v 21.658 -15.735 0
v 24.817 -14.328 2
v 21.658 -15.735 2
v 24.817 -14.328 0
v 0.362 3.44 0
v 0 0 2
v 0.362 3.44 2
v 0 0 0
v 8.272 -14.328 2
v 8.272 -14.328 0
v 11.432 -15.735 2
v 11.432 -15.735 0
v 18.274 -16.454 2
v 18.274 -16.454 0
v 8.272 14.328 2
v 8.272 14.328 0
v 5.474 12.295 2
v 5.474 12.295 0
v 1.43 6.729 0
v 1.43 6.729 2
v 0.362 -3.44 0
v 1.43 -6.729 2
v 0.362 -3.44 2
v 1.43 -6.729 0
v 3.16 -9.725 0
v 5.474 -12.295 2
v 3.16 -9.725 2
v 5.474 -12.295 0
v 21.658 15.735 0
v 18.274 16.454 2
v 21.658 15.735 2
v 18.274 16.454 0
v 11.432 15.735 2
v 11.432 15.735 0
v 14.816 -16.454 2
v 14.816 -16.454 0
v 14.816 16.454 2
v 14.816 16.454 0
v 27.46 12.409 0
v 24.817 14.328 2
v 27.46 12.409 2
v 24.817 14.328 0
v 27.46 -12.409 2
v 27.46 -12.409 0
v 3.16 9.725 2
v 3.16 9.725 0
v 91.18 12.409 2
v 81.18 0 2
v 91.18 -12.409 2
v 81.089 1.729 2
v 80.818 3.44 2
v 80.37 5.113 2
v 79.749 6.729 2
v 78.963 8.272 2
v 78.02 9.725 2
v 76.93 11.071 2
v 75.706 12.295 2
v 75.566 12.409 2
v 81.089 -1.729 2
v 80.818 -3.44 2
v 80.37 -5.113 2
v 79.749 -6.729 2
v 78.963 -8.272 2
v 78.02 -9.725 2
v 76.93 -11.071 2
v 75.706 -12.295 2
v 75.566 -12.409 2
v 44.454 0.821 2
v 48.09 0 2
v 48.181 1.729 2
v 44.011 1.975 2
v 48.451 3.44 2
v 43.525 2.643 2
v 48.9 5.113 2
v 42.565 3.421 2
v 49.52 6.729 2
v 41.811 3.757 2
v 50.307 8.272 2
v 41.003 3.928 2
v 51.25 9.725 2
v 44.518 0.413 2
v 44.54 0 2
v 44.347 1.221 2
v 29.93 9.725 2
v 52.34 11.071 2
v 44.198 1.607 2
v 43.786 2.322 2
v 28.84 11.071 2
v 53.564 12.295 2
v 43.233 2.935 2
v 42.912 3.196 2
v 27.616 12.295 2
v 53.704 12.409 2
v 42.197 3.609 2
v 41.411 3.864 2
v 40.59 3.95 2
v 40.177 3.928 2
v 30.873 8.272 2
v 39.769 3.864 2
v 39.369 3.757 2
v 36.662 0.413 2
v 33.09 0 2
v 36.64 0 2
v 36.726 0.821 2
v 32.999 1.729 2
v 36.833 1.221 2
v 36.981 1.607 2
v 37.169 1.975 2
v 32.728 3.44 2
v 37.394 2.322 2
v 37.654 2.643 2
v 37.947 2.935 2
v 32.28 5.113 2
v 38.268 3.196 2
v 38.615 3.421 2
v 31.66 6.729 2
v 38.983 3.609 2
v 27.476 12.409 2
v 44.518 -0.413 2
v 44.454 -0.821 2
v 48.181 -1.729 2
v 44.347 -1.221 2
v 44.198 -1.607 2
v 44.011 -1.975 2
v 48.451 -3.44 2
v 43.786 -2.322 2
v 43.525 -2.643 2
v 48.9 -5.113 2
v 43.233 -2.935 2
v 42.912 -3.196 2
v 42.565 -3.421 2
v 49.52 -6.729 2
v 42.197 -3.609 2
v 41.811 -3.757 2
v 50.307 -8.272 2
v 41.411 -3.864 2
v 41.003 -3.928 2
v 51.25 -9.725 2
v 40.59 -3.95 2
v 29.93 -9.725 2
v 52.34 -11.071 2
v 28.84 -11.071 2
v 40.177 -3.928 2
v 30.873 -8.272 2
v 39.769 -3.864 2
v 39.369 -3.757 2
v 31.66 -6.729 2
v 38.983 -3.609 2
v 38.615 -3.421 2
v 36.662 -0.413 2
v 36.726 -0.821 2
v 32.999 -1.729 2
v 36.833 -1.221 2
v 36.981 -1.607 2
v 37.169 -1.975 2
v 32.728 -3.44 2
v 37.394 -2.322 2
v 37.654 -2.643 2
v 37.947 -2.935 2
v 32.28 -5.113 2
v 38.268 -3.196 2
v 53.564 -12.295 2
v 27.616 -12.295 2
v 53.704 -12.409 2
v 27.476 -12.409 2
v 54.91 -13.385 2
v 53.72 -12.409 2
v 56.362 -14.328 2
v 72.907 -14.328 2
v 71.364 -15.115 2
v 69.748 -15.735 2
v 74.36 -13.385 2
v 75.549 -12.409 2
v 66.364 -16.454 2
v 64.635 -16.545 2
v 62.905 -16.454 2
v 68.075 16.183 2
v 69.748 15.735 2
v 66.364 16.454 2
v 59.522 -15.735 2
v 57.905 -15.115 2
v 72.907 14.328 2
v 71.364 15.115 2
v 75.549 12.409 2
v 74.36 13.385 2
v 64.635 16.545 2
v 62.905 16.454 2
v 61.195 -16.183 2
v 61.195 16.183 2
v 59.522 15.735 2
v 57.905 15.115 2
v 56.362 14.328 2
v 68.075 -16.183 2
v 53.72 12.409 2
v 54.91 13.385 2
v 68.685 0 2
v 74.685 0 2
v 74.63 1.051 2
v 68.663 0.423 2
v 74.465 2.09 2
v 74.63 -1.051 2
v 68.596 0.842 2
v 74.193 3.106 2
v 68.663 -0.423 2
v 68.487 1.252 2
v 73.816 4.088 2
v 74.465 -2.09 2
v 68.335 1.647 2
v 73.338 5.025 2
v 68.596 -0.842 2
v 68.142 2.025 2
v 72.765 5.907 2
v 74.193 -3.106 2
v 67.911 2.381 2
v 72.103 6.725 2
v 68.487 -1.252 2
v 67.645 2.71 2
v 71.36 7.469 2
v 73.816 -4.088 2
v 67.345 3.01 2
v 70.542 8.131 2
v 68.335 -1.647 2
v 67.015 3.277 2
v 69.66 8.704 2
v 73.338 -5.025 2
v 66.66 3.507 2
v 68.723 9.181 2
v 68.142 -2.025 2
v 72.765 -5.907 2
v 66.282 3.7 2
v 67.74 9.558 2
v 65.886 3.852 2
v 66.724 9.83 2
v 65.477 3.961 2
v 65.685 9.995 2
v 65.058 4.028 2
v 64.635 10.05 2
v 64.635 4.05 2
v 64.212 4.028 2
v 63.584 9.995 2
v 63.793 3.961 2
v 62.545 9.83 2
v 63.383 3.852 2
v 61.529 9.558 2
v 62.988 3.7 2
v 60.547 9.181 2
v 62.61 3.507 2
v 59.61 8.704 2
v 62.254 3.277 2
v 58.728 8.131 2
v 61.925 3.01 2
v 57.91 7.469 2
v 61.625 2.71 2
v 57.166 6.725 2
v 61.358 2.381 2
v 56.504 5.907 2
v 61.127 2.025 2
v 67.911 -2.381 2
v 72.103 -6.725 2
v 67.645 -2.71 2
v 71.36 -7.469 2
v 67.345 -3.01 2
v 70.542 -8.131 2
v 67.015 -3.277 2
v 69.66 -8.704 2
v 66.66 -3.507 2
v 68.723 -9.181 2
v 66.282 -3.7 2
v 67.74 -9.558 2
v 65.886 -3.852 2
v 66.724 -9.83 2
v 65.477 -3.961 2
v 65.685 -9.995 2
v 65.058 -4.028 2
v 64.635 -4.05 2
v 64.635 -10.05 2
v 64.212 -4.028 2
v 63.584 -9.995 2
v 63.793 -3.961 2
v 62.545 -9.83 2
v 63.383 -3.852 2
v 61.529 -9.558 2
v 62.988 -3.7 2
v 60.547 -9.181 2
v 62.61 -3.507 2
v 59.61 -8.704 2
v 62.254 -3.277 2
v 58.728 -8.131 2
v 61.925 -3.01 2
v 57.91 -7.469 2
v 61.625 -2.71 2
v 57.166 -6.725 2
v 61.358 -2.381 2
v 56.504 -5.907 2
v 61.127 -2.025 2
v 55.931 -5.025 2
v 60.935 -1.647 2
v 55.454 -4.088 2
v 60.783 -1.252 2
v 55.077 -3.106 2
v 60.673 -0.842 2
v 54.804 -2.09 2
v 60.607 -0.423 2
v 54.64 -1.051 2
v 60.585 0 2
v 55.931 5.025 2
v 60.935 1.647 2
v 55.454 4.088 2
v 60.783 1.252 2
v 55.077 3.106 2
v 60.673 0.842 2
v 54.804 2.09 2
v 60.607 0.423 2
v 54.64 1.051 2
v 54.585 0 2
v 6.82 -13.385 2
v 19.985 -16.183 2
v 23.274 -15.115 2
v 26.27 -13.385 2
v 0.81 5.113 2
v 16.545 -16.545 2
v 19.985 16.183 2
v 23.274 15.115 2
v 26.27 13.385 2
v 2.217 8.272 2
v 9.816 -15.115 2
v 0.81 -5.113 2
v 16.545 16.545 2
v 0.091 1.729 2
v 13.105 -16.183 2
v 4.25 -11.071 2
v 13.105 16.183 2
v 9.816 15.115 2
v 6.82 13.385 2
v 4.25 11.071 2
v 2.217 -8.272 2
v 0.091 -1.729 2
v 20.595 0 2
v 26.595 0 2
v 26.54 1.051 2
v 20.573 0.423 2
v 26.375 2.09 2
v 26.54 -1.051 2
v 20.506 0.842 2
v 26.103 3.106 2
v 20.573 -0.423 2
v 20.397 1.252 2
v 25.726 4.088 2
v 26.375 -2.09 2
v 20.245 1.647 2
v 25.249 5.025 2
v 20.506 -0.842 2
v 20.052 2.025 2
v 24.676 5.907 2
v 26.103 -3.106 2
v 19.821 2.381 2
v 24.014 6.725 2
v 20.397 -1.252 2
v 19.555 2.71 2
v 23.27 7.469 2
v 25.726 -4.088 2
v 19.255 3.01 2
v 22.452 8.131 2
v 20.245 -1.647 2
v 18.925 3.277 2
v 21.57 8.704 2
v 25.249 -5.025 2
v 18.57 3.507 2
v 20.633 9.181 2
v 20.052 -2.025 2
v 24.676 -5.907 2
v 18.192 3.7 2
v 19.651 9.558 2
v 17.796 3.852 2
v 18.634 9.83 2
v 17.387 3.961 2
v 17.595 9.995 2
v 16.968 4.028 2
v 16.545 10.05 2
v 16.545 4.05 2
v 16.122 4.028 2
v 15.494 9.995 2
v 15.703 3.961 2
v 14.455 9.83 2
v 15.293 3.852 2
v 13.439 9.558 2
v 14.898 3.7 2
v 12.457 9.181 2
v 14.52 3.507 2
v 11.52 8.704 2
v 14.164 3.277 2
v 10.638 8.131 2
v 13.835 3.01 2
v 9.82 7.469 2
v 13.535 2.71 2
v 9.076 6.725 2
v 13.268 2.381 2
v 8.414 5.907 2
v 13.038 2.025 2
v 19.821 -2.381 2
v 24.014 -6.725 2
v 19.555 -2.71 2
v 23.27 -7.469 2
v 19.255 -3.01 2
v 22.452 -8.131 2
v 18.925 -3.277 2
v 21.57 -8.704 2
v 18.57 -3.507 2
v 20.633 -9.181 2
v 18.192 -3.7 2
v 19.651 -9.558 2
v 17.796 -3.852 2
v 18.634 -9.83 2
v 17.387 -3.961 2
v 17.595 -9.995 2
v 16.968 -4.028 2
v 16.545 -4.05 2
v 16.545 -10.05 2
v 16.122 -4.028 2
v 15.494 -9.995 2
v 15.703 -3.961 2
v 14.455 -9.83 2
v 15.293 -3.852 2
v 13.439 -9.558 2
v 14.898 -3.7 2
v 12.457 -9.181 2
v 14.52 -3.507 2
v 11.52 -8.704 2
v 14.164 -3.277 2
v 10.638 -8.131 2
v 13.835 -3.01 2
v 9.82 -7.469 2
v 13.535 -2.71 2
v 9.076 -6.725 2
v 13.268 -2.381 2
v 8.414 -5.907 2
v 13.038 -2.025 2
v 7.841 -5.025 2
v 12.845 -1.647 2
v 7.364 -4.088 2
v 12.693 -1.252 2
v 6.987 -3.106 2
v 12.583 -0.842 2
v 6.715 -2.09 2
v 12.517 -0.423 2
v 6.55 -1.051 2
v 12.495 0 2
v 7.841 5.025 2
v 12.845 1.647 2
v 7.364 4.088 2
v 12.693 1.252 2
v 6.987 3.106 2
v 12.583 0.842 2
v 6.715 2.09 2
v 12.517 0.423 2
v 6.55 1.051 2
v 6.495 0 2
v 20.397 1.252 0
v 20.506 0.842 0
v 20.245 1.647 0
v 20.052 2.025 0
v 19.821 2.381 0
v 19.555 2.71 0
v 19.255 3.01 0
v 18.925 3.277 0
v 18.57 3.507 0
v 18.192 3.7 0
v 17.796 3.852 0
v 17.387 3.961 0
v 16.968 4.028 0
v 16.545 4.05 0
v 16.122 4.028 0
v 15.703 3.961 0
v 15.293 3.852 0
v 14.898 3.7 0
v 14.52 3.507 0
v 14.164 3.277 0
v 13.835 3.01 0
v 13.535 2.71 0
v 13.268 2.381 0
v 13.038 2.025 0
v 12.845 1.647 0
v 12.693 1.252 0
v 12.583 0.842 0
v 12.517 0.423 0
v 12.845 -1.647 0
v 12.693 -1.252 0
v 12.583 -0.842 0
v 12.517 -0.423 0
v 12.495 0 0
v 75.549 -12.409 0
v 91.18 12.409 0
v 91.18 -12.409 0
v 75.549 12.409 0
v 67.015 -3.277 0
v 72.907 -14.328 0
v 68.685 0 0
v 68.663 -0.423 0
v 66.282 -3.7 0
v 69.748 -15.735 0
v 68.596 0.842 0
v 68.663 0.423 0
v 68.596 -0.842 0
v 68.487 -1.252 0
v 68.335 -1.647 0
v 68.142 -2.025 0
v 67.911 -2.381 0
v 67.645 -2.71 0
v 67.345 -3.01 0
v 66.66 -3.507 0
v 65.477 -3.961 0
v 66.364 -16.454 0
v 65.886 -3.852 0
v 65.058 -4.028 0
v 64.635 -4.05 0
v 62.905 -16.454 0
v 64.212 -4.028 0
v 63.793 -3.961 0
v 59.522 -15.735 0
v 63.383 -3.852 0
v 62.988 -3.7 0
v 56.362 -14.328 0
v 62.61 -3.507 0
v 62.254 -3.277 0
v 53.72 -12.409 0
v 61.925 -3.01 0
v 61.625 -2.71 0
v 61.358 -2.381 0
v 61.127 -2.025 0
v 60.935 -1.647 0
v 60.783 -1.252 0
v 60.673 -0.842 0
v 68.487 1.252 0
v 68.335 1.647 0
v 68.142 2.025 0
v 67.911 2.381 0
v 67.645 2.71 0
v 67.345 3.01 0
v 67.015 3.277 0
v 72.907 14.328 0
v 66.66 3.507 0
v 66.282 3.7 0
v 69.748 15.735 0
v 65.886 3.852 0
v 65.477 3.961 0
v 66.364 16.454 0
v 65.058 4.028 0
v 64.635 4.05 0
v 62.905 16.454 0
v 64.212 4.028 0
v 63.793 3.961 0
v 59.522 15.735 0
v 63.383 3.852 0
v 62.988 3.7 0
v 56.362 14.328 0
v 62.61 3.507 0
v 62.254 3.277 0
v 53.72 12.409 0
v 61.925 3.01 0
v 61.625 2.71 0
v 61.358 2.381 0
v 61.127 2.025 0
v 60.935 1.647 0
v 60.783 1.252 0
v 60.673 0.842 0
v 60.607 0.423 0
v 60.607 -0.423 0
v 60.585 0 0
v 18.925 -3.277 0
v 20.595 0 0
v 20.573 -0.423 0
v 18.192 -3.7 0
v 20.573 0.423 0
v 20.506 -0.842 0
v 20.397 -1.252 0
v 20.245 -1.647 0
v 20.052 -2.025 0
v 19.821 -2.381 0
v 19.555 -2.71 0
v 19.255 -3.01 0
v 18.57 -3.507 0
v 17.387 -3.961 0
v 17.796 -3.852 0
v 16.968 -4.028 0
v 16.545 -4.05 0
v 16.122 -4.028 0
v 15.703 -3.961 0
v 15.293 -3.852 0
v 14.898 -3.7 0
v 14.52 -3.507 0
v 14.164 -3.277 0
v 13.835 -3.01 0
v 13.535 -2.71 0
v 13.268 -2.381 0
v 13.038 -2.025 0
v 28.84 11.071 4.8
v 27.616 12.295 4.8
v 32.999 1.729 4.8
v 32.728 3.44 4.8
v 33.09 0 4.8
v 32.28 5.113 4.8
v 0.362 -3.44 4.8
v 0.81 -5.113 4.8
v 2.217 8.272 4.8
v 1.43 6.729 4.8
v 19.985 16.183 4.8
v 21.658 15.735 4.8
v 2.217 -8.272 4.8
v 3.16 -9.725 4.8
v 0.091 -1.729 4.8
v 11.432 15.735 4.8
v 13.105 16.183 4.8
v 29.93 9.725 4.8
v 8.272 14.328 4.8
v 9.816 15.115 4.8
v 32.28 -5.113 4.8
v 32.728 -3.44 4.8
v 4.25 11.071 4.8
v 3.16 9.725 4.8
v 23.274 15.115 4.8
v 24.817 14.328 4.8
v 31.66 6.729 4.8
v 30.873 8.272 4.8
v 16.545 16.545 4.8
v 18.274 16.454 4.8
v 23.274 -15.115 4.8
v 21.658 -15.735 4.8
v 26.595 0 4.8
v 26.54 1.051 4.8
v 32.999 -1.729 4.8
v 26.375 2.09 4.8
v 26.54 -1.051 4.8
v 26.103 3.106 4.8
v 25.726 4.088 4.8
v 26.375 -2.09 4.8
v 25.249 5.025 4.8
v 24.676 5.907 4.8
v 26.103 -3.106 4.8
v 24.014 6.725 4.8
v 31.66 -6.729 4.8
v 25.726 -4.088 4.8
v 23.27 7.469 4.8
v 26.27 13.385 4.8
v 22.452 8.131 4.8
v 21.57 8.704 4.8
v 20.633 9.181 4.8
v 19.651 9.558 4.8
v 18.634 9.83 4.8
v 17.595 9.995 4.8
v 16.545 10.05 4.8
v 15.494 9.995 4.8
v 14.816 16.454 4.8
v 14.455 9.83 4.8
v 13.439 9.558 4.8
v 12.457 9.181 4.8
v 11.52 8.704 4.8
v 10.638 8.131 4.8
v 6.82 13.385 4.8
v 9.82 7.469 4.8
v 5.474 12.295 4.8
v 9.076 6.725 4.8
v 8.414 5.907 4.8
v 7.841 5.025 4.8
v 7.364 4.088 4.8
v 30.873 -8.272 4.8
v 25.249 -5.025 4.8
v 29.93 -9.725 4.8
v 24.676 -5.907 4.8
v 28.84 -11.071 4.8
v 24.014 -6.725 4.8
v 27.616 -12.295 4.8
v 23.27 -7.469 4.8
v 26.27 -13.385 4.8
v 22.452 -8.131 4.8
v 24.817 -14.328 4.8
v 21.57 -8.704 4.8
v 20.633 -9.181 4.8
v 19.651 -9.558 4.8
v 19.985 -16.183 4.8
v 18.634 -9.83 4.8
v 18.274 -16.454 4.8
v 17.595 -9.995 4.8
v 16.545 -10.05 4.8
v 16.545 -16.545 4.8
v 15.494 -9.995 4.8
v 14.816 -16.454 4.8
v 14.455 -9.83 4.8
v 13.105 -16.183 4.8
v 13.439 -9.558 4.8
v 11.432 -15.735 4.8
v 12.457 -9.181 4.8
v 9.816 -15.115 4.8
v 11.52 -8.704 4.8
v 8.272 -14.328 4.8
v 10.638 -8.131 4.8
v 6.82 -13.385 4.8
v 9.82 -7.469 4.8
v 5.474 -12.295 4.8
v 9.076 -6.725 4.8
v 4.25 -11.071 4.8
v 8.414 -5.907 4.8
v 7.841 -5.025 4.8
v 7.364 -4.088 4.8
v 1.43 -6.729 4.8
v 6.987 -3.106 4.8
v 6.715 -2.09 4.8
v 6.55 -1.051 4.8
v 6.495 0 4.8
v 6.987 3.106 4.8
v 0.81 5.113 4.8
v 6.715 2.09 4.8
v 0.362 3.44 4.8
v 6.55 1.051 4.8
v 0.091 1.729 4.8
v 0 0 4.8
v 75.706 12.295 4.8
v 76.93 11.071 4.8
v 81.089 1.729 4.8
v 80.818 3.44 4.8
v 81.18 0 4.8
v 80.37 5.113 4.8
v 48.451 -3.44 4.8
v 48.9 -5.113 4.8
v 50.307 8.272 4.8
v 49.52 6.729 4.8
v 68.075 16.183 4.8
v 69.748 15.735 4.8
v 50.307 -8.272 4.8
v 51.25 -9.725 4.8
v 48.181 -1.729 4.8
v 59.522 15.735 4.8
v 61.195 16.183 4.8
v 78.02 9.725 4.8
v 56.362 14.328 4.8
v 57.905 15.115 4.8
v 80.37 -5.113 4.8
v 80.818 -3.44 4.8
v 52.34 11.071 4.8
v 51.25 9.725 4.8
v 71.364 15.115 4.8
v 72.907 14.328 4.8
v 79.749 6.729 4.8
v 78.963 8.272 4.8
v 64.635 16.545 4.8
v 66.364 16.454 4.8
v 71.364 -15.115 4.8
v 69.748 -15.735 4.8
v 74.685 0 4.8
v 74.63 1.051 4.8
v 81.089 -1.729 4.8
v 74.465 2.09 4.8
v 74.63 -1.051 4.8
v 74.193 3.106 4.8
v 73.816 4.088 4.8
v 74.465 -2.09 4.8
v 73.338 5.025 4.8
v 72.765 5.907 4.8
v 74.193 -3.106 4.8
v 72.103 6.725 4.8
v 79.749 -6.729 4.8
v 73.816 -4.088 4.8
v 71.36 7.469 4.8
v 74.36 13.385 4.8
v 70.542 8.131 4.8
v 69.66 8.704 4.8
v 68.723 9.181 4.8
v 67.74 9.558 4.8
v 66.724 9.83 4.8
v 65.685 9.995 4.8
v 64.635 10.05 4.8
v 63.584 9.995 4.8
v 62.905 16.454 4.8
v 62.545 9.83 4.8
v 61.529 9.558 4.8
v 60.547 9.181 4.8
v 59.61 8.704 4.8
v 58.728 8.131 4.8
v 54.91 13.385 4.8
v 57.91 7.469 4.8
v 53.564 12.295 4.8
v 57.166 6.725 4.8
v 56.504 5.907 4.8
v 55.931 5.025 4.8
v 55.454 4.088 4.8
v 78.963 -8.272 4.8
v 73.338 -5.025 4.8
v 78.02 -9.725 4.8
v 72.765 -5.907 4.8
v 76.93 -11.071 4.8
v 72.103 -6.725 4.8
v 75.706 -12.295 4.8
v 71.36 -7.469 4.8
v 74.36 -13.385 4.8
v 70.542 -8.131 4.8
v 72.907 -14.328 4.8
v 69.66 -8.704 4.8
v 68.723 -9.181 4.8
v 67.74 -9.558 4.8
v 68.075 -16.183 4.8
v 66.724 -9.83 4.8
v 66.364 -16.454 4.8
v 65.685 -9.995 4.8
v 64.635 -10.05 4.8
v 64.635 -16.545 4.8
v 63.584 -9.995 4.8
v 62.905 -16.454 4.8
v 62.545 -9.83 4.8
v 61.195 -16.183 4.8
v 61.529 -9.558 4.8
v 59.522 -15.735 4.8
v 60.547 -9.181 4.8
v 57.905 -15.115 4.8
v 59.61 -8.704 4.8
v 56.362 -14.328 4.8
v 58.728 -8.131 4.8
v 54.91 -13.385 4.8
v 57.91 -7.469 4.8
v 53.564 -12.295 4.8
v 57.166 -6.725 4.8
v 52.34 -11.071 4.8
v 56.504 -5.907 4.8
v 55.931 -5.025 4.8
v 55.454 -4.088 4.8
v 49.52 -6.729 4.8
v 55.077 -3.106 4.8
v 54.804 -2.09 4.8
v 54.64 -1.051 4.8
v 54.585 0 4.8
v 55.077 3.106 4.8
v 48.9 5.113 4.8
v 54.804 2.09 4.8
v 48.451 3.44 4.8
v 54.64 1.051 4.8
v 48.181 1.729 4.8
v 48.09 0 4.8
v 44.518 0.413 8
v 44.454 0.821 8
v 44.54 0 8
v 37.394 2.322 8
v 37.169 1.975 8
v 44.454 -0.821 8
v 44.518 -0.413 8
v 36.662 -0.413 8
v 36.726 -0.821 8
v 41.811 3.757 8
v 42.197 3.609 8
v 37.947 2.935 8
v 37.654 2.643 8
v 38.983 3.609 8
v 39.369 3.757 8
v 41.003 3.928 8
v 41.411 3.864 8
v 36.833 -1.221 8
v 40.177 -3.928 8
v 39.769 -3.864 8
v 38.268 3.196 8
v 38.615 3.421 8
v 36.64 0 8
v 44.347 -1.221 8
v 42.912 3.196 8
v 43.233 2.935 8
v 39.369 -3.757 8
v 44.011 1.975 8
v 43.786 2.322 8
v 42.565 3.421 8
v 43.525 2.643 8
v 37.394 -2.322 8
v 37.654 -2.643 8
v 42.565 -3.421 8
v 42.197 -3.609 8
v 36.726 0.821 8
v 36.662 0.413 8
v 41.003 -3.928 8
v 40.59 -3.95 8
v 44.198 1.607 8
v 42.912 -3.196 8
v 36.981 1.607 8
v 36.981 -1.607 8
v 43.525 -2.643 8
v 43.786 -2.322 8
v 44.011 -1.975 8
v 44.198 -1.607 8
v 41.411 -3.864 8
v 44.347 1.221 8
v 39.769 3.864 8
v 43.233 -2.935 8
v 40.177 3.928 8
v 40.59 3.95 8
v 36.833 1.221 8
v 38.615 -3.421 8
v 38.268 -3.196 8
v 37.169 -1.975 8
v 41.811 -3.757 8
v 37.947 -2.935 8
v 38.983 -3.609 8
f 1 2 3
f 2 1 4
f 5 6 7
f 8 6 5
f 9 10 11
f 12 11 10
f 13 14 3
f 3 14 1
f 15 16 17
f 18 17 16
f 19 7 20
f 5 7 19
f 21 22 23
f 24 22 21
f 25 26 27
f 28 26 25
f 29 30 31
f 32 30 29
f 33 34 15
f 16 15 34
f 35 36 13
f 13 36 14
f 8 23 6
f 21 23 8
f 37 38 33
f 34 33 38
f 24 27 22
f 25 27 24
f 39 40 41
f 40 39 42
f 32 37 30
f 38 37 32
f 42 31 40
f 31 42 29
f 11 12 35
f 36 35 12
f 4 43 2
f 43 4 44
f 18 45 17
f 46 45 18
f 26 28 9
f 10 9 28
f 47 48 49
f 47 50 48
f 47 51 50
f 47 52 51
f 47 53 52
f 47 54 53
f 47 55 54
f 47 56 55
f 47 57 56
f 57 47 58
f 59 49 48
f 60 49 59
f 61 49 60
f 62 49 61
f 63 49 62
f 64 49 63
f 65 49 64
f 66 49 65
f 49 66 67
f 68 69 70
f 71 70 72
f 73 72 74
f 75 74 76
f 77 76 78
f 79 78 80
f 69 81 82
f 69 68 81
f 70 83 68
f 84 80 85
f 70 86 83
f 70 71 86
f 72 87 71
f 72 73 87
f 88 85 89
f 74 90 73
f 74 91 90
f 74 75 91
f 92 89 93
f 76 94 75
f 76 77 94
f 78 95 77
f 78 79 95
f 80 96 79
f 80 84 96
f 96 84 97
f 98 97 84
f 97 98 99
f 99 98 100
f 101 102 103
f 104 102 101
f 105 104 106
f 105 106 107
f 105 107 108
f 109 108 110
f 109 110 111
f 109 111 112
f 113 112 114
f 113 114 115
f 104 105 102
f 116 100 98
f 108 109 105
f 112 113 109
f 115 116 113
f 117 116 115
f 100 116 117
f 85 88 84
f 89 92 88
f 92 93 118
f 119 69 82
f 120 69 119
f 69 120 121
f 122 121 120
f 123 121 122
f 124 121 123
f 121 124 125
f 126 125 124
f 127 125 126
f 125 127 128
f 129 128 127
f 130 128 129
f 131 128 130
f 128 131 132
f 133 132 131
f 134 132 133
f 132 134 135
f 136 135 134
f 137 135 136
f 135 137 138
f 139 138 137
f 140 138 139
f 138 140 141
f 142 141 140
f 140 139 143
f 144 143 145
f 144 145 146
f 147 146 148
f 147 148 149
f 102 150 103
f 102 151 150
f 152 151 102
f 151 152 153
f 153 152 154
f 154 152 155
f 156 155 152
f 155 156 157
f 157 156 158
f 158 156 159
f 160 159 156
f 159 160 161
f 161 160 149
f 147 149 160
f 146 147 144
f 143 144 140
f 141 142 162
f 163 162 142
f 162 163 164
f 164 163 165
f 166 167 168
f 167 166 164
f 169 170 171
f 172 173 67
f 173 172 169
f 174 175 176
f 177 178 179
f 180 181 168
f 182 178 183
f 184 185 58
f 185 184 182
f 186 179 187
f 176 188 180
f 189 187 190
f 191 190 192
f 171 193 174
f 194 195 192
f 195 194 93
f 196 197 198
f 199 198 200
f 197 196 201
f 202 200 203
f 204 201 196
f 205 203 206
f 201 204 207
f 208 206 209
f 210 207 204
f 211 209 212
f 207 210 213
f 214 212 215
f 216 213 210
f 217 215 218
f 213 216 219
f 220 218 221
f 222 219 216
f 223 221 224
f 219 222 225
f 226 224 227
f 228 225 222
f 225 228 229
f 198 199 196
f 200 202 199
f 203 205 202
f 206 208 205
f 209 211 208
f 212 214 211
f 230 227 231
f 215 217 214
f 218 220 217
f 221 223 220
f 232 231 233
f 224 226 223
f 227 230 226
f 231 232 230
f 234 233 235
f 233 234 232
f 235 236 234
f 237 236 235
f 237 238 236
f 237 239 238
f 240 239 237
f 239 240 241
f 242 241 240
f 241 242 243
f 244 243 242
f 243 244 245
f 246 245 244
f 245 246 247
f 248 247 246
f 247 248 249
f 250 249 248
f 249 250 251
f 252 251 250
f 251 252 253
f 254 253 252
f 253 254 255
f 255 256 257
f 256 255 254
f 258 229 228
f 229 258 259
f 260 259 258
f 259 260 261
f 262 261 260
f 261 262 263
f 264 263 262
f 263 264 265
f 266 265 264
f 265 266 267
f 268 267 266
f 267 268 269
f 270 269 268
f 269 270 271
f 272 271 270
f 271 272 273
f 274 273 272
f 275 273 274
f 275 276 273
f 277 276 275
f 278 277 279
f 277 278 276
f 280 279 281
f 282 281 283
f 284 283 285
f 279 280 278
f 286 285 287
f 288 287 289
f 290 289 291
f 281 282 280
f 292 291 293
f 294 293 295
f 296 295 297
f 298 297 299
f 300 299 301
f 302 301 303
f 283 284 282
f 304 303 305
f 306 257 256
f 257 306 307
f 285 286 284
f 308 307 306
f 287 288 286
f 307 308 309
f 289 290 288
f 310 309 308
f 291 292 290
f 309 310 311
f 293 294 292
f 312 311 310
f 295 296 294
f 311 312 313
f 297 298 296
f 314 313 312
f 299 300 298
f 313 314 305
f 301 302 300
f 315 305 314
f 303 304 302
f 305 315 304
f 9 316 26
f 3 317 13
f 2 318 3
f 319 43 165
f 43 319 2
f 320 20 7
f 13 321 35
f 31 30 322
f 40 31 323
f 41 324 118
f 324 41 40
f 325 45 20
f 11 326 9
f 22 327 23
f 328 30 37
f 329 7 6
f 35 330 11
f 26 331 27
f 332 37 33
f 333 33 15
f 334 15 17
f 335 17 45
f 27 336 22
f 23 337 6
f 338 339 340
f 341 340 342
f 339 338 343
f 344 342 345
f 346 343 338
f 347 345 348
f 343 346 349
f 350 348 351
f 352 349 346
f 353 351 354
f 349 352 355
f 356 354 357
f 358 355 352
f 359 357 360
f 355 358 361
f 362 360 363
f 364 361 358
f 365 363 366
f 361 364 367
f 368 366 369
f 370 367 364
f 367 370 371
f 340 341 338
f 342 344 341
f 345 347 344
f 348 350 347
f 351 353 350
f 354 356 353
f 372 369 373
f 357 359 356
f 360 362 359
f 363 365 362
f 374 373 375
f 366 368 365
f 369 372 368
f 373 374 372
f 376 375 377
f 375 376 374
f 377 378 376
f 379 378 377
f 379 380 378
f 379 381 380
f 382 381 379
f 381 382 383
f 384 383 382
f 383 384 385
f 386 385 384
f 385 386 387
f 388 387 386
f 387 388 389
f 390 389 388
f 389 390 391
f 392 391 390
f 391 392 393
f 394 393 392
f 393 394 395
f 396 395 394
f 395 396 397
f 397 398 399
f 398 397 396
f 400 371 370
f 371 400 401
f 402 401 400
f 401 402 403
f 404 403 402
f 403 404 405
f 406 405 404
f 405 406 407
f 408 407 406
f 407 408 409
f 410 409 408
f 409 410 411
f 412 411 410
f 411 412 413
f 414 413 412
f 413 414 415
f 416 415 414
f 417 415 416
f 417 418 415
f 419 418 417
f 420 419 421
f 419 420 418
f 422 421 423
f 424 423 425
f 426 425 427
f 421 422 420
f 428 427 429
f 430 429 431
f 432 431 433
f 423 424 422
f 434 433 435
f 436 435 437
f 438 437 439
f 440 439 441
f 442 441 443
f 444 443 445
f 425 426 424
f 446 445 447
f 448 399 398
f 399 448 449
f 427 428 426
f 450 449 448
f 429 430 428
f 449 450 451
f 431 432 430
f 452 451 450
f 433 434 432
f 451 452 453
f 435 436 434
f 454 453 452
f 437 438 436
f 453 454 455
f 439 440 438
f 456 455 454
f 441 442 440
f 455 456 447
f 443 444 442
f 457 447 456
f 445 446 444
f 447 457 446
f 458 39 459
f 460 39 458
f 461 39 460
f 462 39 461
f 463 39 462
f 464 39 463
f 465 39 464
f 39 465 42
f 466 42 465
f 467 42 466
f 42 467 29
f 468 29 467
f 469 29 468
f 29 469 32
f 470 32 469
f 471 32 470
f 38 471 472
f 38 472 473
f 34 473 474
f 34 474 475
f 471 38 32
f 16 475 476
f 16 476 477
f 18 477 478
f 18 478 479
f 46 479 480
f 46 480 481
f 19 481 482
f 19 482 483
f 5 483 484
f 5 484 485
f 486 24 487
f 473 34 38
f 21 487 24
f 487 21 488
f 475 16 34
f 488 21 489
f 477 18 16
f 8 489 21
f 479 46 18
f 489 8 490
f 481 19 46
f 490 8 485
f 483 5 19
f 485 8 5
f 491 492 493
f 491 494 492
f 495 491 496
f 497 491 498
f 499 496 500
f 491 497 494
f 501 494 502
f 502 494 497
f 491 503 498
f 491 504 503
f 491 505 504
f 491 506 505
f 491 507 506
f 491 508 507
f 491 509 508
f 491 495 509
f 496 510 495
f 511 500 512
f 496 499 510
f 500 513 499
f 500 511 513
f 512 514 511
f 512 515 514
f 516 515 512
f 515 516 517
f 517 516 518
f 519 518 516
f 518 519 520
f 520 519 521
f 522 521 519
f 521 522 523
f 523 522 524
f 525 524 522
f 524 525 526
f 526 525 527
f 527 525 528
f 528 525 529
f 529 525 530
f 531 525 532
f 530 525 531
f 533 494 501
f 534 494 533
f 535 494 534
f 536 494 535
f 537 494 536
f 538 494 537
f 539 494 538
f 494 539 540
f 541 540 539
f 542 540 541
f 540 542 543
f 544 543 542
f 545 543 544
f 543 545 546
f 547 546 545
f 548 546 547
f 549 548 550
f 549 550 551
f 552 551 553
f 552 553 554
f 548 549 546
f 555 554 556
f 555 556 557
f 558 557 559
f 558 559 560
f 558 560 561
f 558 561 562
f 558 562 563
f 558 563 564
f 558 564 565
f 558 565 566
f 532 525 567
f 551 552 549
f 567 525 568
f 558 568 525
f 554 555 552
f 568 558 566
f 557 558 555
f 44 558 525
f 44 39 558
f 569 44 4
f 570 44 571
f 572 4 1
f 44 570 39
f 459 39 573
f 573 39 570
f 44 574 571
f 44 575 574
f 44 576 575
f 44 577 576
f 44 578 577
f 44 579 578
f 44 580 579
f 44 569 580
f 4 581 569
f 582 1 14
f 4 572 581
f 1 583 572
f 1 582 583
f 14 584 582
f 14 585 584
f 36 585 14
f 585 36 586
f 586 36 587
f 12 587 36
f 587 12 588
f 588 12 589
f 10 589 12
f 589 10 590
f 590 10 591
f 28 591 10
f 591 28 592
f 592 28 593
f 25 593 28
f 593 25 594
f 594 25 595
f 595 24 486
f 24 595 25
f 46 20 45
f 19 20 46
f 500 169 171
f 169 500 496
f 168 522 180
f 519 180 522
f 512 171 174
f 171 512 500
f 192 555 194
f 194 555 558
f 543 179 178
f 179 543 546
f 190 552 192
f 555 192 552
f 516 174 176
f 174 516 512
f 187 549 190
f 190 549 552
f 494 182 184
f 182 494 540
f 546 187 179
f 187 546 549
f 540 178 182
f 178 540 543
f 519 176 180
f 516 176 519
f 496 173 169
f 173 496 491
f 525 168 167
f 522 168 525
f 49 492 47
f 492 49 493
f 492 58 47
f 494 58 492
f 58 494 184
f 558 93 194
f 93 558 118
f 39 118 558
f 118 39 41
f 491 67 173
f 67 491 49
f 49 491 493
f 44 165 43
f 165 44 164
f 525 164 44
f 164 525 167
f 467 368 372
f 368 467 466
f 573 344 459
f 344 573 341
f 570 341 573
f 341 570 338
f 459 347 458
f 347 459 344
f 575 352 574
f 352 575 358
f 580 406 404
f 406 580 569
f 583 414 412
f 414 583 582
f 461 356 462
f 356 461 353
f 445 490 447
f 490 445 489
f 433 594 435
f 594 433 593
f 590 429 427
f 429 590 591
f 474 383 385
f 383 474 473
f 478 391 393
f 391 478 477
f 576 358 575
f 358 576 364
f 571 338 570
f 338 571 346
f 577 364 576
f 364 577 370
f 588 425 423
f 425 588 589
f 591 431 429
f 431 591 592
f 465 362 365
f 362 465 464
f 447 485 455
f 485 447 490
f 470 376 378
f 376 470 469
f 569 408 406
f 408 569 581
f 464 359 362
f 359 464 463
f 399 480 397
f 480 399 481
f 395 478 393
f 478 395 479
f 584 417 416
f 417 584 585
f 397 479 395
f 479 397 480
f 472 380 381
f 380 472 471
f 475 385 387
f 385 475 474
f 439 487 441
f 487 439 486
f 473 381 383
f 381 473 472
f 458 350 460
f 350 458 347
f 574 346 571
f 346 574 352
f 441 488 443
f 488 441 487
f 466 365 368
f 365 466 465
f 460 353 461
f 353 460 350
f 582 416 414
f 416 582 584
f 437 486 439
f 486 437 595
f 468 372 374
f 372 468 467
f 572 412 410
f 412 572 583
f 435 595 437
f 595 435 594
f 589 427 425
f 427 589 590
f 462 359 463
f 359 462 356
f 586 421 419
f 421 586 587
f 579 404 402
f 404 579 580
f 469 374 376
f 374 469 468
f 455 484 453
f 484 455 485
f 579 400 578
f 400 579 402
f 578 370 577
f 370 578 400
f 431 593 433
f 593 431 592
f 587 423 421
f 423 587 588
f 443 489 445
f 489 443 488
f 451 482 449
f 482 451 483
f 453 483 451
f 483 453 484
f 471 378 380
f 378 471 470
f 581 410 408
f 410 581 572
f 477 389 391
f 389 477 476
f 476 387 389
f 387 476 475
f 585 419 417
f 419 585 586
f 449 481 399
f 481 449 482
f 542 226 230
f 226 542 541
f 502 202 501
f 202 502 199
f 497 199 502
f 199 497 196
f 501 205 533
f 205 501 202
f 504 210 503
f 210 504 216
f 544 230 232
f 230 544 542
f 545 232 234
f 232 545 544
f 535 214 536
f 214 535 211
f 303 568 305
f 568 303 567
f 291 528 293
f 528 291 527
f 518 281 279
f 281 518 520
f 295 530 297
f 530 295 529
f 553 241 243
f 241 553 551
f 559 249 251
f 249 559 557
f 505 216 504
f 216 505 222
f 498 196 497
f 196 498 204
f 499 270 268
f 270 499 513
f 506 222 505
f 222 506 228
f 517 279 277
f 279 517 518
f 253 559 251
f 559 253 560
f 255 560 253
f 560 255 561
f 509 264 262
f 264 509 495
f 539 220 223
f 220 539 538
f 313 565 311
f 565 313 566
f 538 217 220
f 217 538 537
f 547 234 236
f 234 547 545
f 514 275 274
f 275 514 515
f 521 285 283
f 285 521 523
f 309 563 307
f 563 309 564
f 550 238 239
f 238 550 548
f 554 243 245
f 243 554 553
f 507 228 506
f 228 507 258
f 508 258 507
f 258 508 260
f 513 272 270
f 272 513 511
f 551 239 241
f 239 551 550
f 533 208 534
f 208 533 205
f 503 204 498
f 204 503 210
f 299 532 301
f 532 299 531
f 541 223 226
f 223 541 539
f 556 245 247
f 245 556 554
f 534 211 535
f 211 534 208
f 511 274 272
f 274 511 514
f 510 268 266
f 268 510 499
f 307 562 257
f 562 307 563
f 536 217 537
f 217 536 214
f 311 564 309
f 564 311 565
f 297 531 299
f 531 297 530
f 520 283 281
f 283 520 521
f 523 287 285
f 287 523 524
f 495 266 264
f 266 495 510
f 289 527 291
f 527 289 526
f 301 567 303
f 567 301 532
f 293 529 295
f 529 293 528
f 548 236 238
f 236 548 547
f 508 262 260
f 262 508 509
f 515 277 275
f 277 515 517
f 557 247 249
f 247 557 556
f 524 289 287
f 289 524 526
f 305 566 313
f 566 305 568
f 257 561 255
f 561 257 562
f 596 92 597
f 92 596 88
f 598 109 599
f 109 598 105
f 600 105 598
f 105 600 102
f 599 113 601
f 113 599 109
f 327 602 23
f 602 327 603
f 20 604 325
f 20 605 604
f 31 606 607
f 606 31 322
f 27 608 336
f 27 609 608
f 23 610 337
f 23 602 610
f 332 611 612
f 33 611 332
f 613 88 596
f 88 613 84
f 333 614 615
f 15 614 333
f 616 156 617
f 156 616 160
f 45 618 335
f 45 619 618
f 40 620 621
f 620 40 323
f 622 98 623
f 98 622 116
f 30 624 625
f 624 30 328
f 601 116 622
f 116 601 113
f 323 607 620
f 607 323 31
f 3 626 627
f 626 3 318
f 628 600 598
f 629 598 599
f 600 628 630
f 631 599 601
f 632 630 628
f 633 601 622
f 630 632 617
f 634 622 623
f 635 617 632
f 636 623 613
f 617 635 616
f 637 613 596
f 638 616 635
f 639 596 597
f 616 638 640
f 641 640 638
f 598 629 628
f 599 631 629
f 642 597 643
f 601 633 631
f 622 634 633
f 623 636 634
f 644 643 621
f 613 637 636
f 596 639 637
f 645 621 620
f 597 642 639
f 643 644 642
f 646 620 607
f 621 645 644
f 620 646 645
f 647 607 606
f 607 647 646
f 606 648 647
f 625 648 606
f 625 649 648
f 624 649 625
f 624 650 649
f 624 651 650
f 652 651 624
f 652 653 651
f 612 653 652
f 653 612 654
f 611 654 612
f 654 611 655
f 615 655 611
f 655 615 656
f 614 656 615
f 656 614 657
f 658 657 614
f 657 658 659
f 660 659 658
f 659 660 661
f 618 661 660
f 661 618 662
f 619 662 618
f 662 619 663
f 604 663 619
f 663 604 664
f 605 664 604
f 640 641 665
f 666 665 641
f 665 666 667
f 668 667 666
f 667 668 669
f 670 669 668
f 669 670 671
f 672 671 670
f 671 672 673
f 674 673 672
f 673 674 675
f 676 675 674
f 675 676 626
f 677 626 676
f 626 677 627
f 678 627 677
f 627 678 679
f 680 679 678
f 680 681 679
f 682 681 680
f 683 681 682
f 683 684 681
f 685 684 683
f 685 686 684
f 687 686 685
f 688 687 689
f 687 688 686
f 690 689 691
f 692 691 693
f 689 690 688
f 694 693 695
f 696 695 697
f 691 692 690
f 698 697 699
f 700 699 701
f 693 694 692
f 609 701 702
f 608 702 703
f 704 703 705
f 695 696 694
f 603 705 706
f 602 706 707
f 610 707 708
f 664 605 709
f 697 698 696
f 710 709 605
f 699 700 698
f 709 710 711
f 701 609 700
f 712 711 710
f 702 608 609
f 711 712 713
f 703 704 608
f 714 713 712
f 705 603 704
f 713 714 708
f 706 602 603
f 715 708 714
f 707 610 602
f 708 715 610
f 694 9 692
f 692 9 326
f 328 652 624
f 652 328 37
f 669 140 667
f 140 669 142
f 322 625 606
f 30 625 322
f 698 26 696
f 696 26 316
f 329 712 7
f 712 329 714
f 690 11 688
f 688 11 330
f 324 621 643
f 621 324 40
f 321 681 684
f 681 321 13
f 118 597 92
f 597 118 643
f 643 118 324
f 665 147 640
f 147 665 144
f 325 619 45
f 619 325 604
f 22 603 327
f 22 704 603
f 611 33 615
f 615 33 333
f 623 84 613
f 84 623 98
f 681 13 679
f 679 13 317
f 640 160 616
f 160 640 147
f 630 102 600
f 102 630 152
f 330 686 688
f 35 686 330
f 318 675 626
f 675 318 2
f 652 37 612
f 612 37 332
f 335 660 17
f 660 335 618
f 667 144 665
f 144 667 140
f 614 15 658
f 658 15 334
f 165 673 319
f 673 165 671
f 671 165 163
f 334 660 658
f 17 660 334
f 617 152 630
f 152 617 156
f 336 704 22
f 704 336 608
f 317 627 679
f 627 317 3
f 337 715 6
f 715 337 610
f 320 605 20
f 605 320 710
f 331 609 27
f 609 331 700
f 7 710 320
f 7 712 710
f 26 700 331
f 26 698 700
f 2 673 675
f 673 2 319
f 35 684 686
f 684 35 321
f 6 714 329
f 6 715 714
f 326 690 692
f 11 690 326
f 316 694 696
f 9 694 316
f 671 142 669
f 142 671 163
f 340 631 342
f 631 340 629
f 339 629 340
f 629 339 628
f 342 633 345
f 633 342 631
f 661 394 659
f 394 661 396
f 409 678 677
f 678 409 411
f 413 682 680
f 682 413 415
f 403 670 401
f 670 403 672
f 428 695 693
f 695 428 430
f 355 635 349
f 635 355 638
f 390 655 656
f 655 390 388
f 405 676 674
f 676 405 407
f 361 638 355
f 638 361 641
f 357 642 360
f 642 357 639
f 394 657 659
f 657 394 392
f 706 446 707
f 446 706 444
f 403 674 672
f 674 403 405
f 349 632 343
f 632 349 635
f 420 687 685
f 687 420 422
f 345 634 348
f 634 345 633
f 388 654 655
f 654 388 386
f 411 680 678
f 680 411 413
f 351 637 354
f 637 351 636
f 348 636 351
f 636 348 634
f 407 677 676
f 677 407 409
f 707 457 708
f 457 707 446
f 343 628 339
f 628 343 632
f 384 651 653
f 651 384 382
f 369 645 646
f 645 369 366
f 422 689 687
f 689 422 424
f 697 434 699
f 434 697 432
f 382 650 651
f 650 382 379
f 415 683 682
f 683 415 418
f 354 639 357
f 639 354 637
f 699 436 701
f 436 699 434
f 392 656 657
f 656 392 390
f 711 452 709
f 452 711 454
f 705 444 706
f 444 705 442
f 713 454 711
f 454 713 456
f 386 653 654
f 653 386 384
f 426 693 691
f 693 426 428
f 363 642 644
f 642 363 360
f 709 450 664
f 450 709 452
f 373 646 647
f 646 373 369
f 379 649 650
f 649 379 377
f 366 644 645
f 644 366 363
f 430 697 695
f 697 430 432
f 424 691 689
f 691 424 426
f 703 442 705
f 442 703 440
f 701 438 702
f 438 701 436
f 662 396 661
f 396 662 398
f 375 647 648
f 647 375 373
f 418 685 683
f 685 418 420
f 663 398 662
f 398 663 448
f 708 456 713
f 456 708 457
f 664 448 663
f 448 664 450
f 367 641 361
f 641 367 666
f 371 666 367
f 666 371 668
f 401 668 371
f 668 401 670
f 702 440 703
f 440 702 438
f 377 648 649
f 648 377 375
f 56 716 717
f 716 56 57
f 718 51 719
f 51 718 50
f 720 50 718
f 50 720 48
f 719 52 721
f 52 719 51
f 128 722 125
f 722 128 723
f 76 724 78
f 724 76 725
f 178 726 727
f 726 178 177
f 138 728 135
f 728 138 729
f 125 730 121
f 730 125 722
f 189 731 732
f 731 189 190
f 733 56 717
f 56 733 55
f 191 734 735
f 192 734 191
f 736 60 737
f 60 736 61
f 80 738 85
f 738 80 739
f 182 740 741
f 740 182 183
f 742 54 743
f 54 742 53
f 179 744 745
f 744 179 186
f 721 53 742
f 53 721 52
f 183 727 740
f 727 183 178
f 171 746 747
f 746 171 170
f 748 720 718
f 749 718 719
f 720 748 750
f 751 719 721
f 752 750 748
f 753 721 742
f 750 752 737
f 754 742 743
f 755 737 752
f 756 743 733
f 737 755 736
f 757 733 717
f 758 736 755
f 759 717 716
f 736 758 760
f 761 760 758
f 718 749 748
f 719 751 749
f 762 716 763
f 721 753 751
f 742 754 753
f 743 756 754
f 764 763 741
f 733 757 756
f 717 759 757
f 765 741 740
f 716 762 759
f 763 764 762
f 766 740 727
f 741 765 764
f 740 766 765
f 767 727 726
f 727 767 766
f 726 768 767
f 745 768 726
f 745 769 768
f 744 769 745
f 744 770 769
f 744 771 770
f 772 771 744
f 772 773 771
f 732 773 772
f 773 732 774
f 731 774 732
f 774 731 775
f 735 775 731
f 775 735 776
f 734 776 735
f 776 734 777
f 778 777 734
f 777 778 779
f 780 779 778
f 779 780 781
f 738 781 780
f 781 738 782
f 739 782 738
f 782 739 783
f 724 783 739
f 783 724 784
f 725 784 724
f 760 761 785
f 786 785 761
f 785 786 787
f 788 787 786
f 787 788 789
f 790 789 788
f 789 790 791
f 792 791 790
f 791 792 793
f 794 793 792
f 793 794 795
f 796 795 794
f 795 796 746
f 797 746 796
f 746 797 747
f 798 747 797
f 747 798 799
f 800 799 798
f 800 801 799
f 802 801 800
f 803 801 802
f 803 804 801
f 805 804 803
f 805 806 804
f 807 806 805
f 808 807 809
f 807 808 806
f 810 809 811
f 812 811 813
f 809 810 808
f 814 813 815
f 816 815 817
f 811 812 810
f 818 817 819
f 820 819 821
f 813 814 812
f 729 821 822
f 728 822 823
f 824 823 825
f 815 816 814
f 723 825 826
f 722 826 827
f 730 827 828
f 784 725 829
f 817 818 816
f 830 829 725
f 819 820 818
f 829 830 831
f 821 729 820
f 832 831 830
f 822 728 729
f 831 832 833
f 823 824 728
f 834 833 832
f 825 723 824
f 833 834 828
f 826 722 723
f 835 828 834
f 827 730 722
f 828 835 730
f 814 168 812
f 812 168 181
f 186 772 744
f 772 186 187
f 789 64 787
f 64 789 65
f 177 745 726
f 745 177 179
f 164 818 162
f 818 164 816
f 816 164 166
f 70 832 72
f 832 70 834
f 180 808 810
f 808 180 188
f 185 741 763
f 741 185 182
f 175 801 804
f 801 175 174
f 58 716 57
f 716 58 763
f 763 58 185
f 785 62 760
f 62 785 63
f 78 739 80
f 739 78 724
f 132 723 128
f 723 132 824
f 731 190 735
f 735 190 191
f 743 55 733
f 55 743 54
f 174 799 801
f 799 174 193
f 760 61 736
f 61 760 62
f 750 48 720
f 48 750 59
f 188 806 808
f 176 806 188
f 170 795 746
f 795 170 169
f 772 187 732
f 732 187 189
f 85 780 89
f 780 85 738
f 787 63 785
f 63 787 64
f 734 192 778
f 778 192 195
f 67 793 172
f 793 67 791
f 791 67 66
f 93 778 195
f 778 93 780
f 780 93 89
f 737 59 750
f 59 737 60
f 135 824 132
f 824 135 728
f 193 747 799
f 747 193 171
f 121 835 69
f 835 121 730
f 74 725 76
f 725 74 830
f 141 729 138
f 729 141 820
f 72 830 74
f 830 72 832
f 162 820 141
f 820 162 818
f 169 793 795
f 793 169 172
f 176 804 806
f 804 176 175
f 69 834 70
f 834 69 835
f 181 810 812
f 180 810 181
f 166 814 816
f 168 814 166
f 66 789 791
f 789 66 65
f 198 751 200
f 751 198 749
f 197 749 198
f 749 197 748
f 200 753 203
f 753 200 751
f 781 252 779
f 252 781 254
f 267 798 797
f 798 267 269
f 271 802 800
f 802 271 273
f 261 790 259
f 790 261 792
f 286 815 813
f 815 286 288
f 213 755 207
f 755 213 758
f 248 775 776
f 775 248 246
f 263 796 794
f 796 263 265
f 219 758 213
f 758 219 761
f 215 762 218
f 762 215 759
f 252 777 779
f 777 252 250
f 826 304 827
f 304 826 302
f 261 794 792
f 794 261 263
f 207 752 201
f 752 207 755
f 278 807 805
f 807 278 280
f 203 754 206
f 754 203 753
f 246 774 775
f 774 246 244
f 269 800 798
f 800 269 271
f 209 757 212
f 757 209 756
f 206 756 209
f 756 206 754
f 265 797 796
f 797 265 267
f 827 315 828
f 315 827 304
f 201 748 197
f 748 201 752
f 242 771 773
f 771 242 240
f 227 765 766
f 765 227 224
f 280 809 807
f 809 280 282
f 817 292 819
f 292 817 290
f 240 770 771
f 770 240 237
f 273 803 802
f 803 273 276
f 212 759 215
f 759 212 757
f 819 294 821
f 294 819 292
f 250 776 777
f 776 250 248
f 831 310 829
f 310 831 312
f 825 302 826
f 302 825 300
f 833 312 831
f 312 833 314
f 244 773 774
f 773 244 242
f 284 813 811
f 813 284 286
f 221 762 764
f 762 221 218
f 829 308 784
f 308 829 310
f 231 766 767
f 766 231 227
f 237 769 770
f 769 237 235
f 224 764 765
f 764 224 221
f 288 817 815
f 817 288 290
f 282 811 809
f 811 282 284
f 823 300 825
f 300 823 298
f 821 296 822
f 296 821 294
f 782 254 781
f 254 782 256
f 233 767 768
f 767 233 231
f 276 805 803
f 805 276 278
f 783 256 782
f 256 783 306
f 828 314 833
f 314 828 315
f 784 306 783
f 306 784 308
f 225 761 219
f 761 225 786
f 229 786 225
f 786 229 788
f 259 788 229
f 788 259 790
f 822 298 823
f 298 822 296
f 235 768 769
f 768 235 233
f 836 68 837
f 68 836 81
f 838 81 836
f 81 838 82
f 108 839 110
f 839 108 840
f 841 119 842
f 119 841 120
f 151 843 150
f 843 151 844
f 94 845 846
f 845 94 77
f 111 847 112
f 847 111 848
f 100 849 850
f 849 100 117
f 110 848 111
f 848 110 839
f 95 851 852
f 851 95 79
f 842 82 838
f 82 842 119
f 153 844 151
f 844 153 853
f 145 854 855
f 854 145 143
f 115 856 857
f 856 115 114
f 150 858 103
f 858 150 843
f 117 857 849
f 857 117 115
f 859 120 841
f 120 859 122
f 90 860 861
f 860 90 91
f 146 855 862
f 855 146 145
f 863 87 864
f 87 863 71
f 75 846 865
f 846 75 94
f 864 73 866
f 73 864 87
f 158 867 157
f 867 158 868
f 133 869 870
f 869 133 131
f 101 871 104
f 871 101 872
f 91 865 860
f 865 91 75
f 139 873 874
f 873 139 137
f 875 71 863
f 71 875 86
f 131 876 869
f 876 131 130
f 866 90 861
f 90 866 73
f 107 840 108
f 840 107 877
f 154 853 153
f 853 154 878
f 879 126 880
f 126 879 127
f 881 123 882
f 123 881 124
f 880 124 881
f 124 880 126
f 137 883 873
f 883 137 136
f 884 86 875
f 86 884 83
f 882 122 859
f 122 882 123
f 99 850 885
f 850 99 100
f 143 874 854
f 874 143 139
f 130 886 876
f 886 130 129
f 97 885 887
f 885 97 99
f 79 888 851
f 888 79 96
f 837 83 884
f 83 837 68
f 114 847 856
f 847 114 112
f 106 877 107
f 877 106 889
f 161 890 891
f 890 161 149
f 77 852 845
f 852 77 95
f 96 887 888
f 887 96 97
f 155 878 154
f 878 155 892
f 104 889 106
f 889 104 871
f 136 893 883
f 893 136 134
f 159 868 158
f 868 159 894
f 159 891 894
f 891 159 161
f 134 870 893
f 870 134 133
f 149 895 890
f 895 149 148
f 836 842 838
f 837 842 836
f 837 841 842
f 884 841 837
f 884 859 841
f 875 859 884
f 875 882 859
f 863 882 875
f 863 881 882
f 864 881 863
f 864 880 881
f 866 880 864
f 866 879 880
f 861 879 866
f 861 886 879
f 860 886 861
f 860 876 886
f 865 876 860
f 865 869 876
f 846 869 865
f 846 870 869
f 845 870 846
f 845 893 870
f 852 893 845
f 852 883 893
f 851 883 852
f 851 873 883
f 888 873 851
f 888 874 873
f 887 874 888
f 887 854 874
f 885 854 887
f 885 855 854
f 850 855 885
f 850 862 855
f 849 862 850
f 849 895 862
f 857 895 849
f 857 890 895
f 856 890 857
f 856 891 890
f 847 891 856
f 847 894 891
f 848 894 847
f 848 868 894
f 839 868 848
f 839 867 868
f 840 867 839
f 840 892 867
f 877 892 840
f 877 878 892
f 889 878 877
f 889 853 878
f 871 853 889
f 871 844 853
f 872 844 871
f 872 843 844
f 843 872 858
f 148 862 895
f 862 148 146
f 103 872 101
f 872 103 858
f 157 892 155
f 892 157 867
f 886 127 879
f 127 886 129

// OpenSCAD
//
// Project: CMRig - BumpStop part B - this attaches by magnet to
//                  BumpStop part B
// History: Y16M09D08 JMJ  Started this version
//
// TODO: See bumpStopA2 TODO notes (these need to be merged)

// Parameters
magnetDia=19.1; // actual magnet dia
magnetHeight=4.8; // actual magnet height
magnetDiaSpace=1.0; // wiggle room for magnet
magnetHeightContraction=2; // make the depth  less than magnet.
coneHeightFrac = 1/tan(20); // 20 degrees.
buttonStumpHeight = 8; // Height to opp. button.
hCone = 2; // Height of cone
hMagnet = magnetHeight-magnetHeightContraction; // Height of magnet well
holeInnerDia = magnetDia+magnetDiaSpace; // narrow part of cone
holeOuterDia = holeInnerDia+2*hCone*coneHeightFrac; // wider part of cone - 45 degree cone.
wallThickness=2; // also base thickness.
outerDia = holeOuterDia+max(2,wallThickness); // of magnet recepticle
switchDia = 7.9; // Hole to place switch.
switchExtraSpace = 0.2;
switchHoleDia = switchDia+switchExtraSpace;
// Note: pushbutton switch is located midway between holes.
switchFootprintDia = 9.9; // Diameter of pushbutton flange

holeDistanceGap = max(switchFootprintDia+2, 15); // Make sure there is enough distance to place the switch!
holeDistance = outerDia+holeDistanceGap; // distance between the 2 holes for magnets


baseLengthExtra = 10; // How much extra length to base
baseLength = 2*outerDia + holeDistanceGap + baseLengthExtra; // (printed along x)
baseWidth = outerDia*0.75; //(along y)
baseDepth = wallThickness; // (along z)


union() {
    x1 = outerDia/2; // x position of center of first magnet recepticle
    x2 = x1 + holeDistance; // x position for 2nd center...
    switchX = (x1+x2)/2; //midway between the two
    
    // Base    
    baseB(baseLength, baseWidth, outerDia, holeDistance, switchHoleDia, switchX);
    
    // The two magnet receptacles...
    translate([x1, 0, baseDepth])
        magnetReceptacleB(holeInnerDia, holeOuterDia, outerDia, hMagnet, hCone, $fn=60);    
    translate([x2, 0, baseDepth])
        magnetReceptacleB(holeInnerDia, holeOuterDia, outerDia, hMagnet, hCone, $fn=60);
    
    translate([switchX, 0, 0])
                    cylinder(h=buttonStumpHeight, d=switchDia, $fn=60);
}

// The base
//   switchDia: dia of switch hole
//   switchX: x position of center of switch hole
//  Note: the end closer to x=0 is a semi-circle.
//  Note: we also punch switch-hole-sized holes at the base of the 
// recepticles.
module baseB(baseLength, baseWidth, outerDia, holeDistance, switchDia, switchX) {
    x1 = outerDia/2;
    x2 = x1 + holeDistance;
    difference() {
        union() {
            translate([x1, 0, 0]) 
                cylinder(h=baseDepth, d=outerDia);
            translate([x2, 0, 0]) 
                cylinder(h=baseDepth, d=outerDia);
            translate([x1, -baseWidth/2, 0])
                cube([baseLength-outerDia/2, baseWidth, baseDepth]);
        }
        union() {
                translate([x1, 0, -1])
                    cylinder(h=baseLength+2, d=switchDia, $fn=60);
                translate([x2, 0, -1])
                    cylinder(h=baseLength+2, d=switchDia, $fn=60);
        }
    }
}

// A single magnet Recptacle
// It is centered on the origin
// Overall depth (along z) is (hMagnet+hCone)
module magnetReceptacleB(holeInnerDia, holeOuterDia, outerDia, hMagnet, hCone) {
    difference() {
        cylinder(h=hMagnet, d=outerDia);
        union() {
            translate([0,0,-1])
                cylinder(h=hMagnet+2, d=holeInnerDia);
        }
    }
}
